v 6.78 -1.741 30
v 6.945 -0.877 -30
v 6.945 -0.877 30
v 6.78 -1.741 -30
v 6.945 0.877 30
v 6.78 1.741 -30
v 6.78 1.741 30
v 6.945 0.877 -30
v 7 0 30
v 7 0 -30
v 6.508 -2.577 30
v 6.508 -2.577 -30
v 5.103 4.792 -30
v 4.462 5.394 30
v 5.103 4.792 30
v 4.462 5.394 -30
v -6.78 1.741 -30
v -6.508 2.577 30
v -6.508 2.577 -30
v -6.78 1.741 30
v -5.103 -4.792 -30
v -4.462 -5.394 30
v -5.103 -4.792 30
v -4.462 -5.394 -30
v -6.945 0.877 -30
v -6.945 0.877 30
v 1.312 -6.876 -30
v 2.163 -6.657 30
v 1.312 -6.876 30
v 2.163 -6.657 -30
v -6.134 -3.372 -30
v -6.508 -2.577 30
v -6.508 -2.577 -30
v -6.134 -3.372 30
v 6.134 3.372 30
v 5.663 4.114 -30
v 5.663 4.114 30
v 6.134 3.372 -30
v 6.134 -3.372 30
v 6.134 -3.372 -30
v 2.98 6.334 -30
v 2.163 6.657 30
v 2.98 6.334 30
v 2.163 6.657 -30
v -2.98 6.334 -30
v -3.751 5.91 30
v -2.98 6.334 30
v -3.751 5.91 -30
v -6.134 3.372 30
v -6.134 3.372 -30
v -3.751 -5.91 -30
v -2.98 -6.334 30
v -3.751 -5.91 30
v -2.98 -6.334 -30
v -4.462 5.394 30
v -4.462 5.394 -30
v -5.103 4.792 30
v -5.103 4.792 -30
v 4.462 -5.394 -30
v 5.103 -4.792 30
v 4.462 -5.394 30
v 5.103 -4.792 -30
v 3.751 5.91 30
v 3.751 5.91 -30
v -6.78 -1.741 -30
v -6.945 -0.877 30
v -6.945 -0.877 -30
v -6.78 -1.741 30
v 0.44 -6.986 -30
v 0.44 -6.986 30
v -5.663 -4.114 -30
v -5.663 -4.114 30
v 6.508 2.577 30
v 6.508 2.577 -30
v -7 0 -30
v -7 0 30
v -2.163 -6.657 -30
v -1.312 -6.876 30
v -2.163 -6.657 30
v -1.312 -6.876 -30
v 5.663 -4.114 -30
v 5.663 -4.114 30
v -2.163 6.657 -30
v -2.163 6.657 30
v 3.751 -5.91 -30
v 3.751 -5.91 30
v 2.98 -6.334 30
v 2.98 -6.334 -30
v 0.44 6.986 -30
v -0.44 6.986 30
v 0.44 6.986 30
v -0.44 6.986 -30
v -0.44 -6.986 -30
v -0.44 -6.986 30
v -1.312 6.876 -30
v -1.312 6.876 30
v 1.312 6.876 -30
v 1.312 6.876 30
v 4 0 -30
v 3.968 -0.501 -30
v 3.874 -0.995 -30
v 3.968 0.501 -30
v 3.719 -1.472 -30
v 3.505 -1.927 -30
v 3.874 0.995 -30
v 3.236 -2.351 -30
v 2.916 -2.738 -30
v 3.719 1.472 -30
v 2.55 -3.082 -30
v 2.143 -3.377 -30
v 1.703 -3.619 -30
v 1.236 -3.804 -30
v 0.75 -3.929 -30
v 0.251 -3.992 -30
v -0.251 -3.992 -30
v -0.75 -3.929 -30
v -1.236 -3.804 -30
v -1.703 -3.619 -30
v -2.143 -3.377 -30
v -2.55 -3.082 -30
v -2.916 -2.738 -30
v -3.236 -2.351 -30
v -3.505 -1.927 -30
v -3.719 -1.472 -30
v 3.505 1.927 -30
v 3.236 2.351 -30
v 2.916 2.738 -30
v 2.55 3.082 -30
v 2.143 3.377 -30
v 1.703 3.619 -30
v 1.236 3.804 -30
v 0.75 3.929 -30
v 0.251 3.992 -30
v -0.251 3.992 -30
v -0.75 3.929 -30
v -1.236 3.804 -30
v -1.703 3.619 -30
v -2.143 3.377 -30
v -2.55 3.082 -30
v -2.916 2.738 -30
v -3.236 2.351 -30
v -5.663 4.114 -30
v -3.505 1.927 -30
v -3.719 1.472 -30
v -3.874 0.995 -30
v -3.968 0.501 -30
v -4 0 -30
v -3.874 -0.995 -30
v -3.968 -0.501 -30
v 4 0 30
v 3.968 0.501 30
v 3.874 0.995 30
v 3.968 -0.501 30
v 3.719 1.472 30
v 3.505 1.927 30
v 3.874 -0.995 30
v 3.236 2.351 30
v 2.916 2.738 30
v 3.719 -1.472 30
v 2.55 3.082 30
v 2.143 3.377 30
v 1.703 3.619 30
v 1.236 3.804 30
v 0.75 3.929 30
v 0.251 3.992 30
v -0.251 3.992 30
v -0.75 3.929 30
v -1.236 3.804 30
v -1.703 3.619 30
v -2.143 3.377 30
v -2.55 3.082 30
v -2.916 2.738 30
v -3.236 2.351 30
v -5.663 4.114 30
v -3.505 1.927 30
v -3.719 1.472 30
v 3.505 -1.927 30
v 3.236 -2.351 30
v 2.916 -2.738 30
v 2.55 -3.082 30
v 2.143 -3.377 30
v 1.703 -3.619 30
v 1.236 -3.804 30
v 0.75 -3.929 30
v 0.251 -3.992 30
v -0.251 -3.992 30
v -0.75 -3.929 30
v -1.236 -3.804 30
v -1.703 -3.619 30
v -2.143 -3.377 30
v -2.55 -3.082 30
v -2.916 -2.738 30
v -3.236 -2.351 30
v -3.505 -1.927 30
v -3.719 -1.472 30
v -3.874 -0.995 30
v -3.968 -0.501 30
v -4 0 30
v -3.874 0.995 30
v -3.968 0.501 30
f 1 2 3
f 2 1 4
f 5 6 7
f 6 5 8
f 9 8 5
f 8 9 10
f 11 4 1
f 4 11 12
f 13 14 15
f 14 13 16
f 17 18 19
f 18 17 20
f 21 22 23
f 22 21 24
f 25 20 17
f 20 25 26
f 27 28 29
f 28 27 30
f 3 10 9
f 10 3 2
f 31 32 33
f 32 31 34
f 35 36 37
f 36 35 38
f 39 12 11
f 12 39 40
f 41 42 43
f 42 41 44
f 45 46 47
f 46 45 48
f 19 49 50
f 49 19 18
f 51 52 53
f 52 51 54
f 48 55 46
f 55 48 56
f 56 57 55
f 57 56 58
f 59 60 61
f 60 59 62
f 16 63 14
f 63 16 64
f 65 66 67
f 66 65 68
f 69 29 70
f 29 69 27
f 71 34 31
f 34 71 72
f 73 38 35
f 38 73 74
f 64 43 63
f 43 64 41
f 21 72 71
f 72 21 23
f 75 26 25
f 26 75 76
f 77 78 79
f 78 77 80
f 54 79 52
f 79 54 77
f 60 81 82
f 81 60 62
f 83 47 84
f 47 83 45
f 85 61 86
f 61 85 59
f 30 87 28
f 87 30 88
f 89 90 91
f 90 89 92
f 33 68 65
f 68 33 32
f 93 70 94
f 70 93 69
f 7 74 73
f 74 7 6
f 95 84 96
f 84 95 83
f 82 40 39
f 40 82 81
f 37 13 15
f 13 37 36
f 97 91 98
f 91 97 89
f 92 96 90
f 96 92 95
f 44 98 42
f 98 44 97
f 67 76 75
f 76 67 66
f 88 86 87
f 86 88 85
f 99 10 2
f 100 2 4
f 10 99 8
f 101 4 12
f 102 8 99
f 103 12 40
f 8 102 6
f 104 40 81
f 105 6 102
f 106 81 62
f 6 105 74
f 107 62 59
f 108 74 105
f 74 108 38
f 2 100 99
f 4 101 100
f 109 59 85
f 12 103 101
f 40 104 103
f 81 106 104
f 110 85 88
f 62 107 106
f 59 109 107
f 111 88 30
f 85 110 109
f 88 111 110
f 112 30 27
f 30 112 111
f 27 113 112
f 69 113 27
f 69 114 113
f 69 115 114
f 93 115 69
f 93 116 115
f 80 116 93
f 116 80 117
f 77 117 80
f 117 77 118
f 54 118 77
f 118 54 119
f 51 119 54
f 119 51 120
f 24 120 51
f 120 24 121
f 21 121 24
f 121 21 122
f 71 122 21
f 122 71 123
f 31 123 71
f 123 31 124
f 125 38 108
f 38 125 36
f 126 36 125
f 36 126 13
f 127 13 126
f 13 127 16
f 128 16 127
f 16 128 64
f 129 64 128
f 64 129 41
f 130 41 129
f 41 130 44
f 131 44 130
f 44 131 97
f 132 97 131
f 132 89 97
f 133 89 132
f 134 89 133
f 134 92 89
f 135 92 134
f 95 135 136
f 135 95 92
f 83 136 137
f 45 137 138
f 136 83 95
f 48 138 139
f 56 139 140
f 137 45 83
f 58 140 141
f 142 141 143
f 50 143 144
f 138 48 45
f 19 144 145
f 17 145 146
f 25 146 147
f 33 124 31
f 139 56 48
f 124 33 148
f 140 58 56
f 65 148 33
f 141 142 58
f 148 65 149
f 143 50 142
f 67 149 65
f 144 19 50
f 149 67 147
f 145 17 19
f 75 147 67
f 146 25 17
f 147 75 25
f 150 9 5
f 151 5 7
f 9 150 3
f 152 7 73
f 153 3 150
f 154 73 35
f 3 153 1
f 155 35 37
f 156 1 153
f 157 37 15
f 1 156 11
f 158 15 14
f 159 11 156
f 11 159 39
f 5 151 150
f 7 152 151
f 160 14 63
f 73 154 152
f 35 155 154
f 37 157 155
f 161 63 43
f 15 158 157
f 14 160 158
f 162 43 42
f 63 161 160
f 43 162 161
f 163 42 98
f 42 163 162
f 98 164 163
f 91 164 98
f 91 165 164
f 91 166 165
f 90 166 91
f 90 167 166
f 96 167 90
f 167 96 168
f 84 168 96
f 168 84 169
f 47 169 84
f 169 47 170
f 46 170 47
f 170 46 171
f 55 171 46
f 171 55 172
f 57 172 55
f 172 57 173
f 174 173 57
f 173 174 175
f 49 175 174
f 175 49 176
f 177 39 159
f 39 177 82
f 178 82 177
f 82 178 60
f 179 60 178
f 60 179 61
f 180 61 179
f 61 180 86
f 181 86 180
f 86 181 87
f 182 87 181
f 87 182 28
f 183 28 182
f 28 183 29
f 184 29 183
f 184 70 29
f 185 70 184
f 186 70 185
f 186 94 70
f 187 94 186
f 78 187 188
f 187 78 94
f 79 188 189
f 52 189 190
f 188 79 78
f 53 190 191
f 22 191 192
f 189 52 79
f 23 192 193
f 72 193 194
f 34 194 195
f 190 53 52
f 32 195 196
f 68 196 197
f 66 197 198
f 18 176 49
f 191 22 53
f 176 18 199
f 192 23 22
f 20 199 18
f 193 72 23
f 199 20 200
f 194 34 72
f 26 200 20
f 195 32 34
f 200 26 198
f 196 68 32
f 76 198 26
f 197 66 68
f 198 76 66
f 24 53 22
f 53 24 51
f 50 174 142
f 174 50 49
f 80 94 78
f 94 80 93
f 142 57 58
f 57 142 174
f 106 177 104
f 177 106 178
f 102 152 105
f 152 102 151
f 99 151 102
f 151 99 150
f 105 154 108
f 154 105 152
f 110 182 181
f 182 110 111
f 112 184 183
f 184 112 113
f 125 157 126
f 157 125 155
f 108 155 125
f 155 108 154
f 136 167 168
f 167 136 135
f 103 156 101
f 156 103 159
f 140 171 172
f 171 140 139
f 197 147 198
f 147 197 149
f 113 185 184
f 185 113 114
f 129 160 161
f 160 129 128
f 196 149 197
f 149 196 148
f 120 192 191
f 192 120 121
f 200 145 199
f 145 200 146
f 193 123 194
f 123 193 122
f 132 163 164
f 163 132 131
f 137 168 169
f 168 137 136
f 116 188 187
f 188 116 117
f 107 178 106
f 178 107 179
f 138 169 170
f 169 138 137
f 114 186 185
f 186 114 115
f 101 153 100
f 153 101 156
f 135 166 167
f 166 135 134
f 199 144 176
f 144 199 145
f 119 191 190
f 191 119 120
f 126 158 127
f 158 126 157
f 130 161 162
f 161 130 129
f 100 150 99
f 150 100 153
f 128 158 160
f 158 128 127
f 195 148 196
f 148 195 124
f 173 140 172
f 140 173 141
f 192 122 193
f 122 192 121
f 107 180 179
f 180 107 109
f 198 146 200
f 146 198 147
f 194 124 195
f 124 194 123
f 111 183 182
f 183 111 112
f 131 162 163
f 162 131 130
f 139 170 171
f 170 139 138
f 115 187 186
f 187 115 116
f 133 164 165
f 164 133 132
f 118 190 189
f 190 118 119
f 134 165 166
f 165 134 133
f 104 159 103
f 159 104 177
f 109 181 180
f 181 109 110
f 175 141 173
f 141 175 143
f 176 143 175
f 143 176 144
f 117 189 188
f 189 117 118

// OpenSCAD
$fn = 50;


difference() {
	union() {
		translate(v = [0, 0, -30.0000000000]) {
			cylinder(h = 60, r = 7.0000000000);
		}
	}
	union() {
		translate(v = [0, 0, -100.0000000000]) {
			cylinder(h = 200, r = 4.0000000000);
		}
	}
}
